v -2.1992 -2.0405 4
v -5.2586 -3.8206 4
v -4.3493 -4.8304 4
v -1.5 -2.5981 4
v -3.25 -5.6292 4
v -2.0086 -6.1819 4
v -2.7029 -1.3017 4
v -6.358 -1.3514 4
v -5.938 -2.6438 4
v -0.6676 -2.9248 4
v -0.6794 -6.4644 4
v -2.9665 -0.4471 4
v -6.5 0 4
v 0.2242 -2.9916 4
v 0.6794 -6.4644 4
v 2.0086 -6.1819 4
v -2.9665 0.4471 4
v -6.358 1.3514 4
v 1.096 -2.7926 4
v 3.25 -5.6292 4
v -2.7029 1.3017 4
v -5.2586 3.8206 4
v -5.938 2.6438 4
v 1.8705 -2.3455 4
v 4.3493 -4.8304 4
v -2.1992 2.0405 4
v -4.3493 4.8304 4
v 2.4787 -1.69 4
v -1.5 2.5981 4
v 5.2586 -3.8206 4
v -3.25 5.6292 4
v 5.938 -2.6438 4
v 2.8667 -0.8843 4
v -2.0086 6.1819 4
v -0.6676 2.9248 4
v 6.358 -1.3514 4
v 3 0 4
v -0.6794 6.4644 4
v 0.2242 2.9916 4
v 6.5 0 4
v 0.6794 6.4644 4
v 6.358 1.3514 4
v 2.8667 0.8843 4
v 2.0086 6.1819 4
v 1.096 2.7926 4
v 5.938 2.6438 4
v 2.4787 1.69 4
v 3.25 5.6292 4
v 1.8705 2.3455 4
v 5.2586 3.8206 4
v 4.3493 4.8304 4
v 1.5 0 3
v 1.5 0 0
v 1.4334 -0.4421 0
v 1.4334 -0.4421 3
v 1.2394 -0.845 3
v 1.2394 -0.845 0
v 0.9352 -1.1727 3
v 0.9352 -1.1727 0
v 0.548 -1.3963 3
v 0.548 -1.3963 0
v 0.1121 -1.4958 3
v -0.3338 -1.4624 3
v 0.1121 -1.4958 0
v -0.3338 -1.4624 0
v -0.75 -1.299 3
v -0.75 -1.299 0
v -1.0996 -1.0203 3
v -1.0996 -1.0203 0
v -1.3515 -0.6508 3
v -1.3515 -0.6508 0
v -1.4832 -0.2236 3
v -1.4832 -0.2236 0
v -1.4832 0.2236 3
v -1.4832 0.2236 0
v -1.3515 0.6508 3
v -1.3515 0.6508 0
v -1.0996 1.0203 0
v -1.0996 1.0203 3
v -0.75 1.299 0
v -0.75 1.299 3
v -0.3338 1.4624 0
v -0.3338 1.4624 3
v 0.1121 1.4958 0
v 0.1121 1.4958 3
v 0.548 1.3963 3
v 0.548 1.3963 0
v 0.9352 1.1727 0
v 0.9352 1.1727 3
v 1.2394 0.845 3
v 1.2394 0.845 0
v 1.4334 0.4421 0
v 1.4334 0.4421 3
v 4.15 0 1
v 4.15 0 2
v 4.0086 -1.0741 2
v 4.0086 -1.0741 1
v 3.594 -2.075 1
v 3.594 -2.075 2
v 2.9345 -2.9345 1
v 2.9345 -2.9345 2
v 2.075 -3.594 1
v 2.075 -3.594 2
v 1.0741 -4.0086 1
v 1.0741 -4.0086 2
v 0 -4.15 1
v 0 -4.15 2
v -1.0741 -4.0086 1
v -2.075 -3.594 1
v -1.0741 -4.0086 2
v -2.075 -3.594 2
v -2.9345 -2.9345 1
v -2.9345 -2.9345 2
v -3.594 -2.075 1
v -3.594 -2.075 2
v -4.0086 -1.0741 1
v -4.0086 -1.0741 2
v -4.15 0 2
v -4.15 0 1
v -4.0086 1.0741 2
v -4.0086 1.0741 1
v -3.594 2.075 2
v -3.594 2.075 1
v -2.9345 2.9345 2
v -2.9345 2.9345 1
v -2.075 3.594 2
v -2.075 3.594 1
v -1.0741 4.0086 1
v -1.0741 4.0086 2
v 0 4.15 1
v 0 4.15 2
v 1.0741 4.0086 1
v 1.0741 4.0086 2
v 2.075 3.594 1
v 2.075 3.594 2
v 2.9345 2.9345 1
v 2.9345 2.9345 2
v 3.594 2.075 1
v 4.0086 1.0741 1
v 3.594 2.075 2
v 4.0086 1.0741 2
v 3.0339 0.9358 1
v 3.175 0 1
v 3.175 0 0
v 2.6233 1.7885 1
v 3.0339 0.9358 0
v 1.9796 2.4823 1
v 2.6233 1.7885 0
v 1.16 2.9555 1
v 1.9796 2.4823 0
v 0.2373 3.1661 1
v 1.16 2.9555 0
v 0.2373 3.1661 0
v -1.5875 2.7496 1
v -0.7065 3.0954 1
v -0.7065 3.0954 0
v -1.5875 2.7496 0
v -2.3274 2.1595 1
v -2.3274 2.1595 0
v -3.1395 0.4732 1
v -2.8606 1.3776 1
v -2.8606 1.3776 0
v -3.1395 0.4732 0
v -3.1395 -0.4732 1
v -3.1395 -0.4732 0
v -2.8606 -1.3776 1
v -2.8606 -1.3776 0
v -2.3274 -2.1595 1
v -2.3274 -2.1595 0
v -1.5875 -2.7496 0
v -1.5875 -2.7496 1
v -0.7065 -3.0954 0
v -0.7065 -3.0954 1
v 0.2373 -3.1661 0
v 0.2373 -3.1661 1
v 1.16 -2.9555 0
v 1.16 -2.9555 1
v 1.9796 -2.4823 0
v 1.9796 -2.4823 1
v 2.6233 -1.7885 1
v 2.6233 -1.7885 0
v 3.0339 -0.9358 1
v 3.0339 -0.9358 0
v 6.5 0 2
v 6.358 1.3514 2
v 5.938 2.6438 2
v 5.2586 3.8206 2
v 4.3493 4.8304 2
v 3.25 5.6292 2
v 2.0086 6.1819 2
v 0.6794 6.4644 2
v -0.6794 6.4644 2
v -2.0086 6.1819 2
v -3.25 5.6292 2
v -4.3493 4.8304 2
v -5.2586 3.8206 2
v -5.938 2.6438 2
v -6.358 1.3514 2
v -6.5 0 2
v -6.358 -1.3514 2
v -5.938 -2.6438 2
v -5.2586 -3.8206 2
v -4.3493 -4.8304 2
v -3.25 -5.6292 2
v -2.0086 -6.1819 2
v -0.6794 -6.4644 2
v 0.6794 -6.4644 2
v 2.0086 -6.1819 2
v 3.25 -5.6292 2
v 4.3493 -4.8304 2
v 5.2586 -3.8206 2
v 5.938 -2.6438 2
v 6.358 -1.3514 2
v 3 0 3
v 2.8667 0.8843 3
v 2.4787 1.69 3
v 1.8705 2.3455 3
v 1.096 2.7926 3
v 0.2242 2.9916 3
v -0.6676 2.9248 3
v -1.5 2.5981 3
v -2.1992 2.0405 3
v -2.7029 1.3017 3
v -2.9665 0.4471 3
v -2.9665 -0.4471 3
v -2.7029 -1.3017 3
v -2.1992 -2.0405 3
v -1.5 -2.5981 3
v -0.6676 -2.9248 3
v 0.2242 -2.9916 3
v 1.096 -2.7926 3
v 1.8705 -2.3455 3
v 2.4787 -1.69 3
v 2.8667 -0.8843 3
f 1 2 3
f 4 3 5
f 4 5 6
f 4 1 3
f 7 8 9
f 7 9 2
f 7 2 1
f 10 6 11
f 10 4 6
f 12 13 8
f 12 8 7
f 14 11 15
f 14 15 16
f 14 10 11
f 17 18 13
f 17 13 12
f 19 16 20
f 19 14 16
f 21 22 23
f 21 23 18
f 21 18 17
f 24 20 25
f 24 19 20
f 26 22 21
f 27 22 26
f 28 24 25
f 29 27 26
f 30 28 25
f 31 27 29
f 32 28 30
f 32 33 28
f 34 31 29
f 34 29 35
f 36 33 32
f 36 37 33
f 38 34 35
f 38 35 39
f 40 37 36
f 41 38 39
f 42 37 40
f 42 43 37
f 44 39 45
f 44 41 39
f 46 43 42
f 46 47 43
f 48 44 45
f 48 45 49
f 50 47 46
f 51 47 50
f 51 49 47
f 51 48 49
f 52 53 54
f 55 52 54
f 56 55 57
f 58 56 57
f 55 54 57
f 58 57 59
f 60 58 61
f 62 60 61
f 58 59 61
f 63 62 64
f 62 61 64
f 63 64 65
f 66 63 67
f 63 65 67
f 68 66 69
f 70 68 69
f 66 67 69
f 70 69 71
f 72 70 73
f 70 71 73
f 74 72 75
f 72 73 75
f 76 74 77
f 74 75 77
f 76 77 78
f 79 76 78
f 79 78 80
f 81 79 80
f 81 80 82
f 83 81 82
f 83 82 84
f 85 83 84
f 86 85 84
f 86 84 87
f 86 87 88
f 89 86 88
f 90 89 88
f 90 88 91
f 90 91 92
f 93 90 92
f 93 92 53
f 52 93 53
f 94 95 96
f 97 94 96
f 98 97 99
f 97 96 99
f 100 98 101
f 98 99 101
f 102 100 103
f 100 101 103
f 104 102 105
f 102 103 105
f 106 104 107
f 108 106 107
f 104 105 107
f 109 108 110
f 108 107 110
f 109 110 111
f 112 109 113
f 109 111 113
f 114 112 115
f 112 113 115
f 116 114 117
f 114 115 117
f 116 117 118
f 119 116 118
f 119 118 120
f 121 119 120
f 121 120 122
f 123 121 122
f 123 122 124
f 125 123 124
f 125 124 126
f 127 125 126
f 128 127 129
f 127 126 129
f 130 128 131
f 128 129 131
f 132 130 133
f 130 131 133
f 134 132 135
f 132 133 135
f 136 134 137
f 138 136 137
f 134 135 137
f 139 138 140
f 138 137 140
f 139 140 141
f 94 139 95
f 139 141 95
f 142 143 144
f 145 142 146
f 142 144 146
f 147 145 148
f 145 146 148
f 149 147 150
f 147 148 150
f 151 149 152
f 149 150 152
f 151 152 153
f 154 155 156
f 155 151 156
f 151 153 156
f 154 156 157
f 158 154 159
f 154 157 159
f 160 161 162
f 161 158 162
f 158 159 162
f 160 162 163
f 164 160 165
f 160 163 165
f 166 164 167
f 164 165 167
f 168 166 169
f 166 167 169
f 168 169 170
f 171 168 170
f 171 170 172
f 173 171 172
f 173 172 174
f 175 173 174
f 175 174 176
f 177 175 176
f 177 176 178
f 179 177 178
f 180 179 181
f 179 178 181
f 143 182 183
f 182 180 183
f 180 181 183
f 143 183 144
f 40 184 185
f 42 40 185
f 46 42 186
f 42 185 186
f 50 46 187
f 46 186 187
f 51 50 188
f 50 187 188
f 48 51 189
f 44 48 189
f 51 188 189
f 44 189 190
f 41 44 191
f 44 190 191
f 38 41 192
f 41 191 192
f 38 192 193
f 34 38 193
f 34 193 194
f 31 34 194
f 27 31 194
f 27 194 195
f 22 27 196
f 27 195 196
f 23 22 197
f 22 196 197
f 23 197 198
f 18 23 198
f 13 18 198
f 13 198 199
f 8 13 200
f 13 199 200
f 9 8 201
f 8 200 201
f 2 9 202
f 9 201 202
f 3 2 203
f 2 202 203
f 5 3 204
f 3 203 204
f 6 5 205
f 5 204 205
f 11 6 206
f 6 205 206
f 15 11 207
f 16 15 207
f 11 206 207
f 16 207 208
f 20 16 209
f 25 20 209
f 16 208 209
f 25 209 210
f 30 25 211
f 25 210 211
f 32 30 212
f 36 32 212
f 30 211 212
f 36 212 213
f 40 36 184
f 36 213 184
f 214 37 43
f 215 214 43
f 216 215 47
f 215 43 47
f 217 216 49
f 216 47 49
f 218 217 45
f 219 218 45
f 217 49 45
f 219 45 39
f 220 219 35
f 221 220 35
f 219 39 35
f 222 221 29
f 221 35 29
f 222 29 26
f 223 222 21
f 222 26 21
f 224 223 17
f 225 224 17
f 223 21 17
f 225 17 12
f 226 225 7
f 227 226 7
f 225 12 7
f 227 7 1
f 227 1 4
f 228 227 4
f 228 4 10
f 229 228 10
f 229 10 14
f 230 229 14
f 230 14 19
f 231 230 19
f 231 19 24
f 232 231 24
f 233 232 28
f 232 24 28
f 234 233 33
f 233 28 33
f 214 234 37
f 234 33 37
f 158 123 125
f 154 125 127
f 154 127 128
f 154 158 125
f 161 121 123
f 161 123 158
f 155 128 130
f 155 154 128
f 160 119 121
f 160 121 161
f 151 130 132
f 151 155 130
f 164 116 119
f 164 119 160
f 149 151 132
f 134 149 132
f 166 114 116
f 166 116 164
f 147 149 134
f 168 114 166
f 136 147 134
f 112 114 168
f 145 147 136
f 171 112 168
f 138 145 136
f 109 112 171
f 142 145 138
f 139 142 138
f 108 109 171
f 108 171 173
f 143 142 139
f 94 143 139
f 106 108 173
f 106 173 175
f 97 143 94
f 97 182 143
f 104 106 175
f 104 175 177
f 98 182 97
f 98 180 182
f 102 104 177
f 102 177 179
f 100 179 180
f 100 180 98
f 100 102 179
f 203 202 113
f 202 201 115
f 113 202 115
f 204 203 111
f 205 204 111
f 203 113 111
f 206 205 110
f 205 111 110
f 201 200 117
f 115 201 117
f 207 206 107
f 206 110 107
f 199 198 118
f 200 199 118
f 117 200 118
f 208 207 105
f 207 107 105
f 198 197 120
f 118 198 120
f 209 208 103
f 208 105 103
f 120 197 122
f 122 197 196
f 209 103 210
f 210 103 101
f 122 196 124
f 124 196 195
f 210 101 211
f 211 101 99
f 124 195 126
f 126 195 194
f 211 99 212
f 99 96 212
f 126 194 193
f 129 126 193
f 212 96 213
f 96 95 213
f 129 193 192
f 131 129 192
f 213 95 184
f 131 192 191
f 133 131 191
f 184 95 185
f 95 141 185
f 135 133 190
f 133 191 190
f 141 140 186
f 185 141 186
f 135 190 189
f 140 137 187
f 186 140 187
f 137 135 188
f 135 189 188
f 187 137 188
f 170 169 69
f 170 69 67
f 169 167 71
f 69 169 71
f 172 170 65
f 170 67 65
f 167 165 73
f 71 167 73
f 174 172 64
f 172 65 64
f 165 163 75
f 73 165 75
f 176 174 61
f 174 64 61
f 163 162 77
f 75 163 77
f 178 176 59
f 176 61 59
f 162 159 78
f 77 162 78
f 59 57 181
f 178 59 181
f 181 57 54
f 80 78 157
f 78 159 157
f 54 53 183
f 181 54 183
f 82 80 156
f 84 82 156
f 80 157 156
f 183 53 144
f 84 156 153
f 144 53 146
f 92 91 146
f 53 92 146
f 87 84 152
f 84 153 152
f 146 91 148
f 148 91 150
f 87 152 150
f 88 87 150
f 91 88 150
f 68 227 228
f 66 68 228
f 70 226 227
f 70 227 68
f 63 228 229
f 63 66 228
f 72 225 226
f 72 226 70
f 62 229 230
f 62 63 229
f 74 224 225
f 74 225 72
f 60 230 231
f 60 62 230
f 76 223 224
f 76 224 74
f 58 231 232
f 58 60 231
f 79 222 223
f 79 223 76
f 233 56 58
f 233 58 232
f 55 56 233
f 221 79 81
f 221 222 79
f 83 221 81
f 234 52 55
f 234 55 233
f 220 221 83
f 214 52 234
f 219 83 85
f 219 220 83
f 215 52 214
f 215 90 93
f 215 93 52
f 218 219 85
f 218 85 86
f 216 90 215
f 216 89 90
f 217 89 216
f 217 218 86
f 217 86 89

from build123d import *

# Parameters (mm, degrees)
F0_R     = 3.175
F1_DEPTH = 2
F2_R     = 6.5
F3_DEPTH = 2
F4_R     = 3
F5_DEPTH = 1
F6_R     = 1.5
F7_DEPTH = 25
F8_R     = 4.15
F8_R_2   = 3.175
F9_DEPTH = 1


with BuildPart() as f1:
    # F0 (on Top) → F1 (new body)
    with BuildSketch(Plane.XY):
        Circle(F0_R)
    extrude(amount=F1_DEPTH)

    # F2 (on face) → F3 (join)
    with BuildSketch(Plane.XY.offset(2)):
        Circle(F2_R)
    extrude(amount=F3_DEPTH)

    # F4 (on face) → F5 (cut)
    with BuildSketch(Plane.XY.offset(4)):
        Circle(F4_R)
    extrude(amount=-F5_DEPTH, mode=Mode.SUBTRACT)

    # F6 (on face) → F7 (cut)
    with BuildSketch(Plane(origin=(0, 0, 0), x_dir=(1, 0, 0), z_dir=(0, 0, -1))):
        Circle(F6_R)
    extrude(amount=-F7_DEPTH, mode=Mode.SUBTRACT)

    # F8 (on face) → F9 (join)
    with BuildSketch(Plane(origin=(0, 0, 2), x_dir=(1, 0, 0), z_dir=(0, 0, -1))):
        Circle(F8_R)
        Circle(F8_R_2, mode=Mode.SUBTRACT)
    extrude(amount=F9_DEPTH)


solid = f1.part
